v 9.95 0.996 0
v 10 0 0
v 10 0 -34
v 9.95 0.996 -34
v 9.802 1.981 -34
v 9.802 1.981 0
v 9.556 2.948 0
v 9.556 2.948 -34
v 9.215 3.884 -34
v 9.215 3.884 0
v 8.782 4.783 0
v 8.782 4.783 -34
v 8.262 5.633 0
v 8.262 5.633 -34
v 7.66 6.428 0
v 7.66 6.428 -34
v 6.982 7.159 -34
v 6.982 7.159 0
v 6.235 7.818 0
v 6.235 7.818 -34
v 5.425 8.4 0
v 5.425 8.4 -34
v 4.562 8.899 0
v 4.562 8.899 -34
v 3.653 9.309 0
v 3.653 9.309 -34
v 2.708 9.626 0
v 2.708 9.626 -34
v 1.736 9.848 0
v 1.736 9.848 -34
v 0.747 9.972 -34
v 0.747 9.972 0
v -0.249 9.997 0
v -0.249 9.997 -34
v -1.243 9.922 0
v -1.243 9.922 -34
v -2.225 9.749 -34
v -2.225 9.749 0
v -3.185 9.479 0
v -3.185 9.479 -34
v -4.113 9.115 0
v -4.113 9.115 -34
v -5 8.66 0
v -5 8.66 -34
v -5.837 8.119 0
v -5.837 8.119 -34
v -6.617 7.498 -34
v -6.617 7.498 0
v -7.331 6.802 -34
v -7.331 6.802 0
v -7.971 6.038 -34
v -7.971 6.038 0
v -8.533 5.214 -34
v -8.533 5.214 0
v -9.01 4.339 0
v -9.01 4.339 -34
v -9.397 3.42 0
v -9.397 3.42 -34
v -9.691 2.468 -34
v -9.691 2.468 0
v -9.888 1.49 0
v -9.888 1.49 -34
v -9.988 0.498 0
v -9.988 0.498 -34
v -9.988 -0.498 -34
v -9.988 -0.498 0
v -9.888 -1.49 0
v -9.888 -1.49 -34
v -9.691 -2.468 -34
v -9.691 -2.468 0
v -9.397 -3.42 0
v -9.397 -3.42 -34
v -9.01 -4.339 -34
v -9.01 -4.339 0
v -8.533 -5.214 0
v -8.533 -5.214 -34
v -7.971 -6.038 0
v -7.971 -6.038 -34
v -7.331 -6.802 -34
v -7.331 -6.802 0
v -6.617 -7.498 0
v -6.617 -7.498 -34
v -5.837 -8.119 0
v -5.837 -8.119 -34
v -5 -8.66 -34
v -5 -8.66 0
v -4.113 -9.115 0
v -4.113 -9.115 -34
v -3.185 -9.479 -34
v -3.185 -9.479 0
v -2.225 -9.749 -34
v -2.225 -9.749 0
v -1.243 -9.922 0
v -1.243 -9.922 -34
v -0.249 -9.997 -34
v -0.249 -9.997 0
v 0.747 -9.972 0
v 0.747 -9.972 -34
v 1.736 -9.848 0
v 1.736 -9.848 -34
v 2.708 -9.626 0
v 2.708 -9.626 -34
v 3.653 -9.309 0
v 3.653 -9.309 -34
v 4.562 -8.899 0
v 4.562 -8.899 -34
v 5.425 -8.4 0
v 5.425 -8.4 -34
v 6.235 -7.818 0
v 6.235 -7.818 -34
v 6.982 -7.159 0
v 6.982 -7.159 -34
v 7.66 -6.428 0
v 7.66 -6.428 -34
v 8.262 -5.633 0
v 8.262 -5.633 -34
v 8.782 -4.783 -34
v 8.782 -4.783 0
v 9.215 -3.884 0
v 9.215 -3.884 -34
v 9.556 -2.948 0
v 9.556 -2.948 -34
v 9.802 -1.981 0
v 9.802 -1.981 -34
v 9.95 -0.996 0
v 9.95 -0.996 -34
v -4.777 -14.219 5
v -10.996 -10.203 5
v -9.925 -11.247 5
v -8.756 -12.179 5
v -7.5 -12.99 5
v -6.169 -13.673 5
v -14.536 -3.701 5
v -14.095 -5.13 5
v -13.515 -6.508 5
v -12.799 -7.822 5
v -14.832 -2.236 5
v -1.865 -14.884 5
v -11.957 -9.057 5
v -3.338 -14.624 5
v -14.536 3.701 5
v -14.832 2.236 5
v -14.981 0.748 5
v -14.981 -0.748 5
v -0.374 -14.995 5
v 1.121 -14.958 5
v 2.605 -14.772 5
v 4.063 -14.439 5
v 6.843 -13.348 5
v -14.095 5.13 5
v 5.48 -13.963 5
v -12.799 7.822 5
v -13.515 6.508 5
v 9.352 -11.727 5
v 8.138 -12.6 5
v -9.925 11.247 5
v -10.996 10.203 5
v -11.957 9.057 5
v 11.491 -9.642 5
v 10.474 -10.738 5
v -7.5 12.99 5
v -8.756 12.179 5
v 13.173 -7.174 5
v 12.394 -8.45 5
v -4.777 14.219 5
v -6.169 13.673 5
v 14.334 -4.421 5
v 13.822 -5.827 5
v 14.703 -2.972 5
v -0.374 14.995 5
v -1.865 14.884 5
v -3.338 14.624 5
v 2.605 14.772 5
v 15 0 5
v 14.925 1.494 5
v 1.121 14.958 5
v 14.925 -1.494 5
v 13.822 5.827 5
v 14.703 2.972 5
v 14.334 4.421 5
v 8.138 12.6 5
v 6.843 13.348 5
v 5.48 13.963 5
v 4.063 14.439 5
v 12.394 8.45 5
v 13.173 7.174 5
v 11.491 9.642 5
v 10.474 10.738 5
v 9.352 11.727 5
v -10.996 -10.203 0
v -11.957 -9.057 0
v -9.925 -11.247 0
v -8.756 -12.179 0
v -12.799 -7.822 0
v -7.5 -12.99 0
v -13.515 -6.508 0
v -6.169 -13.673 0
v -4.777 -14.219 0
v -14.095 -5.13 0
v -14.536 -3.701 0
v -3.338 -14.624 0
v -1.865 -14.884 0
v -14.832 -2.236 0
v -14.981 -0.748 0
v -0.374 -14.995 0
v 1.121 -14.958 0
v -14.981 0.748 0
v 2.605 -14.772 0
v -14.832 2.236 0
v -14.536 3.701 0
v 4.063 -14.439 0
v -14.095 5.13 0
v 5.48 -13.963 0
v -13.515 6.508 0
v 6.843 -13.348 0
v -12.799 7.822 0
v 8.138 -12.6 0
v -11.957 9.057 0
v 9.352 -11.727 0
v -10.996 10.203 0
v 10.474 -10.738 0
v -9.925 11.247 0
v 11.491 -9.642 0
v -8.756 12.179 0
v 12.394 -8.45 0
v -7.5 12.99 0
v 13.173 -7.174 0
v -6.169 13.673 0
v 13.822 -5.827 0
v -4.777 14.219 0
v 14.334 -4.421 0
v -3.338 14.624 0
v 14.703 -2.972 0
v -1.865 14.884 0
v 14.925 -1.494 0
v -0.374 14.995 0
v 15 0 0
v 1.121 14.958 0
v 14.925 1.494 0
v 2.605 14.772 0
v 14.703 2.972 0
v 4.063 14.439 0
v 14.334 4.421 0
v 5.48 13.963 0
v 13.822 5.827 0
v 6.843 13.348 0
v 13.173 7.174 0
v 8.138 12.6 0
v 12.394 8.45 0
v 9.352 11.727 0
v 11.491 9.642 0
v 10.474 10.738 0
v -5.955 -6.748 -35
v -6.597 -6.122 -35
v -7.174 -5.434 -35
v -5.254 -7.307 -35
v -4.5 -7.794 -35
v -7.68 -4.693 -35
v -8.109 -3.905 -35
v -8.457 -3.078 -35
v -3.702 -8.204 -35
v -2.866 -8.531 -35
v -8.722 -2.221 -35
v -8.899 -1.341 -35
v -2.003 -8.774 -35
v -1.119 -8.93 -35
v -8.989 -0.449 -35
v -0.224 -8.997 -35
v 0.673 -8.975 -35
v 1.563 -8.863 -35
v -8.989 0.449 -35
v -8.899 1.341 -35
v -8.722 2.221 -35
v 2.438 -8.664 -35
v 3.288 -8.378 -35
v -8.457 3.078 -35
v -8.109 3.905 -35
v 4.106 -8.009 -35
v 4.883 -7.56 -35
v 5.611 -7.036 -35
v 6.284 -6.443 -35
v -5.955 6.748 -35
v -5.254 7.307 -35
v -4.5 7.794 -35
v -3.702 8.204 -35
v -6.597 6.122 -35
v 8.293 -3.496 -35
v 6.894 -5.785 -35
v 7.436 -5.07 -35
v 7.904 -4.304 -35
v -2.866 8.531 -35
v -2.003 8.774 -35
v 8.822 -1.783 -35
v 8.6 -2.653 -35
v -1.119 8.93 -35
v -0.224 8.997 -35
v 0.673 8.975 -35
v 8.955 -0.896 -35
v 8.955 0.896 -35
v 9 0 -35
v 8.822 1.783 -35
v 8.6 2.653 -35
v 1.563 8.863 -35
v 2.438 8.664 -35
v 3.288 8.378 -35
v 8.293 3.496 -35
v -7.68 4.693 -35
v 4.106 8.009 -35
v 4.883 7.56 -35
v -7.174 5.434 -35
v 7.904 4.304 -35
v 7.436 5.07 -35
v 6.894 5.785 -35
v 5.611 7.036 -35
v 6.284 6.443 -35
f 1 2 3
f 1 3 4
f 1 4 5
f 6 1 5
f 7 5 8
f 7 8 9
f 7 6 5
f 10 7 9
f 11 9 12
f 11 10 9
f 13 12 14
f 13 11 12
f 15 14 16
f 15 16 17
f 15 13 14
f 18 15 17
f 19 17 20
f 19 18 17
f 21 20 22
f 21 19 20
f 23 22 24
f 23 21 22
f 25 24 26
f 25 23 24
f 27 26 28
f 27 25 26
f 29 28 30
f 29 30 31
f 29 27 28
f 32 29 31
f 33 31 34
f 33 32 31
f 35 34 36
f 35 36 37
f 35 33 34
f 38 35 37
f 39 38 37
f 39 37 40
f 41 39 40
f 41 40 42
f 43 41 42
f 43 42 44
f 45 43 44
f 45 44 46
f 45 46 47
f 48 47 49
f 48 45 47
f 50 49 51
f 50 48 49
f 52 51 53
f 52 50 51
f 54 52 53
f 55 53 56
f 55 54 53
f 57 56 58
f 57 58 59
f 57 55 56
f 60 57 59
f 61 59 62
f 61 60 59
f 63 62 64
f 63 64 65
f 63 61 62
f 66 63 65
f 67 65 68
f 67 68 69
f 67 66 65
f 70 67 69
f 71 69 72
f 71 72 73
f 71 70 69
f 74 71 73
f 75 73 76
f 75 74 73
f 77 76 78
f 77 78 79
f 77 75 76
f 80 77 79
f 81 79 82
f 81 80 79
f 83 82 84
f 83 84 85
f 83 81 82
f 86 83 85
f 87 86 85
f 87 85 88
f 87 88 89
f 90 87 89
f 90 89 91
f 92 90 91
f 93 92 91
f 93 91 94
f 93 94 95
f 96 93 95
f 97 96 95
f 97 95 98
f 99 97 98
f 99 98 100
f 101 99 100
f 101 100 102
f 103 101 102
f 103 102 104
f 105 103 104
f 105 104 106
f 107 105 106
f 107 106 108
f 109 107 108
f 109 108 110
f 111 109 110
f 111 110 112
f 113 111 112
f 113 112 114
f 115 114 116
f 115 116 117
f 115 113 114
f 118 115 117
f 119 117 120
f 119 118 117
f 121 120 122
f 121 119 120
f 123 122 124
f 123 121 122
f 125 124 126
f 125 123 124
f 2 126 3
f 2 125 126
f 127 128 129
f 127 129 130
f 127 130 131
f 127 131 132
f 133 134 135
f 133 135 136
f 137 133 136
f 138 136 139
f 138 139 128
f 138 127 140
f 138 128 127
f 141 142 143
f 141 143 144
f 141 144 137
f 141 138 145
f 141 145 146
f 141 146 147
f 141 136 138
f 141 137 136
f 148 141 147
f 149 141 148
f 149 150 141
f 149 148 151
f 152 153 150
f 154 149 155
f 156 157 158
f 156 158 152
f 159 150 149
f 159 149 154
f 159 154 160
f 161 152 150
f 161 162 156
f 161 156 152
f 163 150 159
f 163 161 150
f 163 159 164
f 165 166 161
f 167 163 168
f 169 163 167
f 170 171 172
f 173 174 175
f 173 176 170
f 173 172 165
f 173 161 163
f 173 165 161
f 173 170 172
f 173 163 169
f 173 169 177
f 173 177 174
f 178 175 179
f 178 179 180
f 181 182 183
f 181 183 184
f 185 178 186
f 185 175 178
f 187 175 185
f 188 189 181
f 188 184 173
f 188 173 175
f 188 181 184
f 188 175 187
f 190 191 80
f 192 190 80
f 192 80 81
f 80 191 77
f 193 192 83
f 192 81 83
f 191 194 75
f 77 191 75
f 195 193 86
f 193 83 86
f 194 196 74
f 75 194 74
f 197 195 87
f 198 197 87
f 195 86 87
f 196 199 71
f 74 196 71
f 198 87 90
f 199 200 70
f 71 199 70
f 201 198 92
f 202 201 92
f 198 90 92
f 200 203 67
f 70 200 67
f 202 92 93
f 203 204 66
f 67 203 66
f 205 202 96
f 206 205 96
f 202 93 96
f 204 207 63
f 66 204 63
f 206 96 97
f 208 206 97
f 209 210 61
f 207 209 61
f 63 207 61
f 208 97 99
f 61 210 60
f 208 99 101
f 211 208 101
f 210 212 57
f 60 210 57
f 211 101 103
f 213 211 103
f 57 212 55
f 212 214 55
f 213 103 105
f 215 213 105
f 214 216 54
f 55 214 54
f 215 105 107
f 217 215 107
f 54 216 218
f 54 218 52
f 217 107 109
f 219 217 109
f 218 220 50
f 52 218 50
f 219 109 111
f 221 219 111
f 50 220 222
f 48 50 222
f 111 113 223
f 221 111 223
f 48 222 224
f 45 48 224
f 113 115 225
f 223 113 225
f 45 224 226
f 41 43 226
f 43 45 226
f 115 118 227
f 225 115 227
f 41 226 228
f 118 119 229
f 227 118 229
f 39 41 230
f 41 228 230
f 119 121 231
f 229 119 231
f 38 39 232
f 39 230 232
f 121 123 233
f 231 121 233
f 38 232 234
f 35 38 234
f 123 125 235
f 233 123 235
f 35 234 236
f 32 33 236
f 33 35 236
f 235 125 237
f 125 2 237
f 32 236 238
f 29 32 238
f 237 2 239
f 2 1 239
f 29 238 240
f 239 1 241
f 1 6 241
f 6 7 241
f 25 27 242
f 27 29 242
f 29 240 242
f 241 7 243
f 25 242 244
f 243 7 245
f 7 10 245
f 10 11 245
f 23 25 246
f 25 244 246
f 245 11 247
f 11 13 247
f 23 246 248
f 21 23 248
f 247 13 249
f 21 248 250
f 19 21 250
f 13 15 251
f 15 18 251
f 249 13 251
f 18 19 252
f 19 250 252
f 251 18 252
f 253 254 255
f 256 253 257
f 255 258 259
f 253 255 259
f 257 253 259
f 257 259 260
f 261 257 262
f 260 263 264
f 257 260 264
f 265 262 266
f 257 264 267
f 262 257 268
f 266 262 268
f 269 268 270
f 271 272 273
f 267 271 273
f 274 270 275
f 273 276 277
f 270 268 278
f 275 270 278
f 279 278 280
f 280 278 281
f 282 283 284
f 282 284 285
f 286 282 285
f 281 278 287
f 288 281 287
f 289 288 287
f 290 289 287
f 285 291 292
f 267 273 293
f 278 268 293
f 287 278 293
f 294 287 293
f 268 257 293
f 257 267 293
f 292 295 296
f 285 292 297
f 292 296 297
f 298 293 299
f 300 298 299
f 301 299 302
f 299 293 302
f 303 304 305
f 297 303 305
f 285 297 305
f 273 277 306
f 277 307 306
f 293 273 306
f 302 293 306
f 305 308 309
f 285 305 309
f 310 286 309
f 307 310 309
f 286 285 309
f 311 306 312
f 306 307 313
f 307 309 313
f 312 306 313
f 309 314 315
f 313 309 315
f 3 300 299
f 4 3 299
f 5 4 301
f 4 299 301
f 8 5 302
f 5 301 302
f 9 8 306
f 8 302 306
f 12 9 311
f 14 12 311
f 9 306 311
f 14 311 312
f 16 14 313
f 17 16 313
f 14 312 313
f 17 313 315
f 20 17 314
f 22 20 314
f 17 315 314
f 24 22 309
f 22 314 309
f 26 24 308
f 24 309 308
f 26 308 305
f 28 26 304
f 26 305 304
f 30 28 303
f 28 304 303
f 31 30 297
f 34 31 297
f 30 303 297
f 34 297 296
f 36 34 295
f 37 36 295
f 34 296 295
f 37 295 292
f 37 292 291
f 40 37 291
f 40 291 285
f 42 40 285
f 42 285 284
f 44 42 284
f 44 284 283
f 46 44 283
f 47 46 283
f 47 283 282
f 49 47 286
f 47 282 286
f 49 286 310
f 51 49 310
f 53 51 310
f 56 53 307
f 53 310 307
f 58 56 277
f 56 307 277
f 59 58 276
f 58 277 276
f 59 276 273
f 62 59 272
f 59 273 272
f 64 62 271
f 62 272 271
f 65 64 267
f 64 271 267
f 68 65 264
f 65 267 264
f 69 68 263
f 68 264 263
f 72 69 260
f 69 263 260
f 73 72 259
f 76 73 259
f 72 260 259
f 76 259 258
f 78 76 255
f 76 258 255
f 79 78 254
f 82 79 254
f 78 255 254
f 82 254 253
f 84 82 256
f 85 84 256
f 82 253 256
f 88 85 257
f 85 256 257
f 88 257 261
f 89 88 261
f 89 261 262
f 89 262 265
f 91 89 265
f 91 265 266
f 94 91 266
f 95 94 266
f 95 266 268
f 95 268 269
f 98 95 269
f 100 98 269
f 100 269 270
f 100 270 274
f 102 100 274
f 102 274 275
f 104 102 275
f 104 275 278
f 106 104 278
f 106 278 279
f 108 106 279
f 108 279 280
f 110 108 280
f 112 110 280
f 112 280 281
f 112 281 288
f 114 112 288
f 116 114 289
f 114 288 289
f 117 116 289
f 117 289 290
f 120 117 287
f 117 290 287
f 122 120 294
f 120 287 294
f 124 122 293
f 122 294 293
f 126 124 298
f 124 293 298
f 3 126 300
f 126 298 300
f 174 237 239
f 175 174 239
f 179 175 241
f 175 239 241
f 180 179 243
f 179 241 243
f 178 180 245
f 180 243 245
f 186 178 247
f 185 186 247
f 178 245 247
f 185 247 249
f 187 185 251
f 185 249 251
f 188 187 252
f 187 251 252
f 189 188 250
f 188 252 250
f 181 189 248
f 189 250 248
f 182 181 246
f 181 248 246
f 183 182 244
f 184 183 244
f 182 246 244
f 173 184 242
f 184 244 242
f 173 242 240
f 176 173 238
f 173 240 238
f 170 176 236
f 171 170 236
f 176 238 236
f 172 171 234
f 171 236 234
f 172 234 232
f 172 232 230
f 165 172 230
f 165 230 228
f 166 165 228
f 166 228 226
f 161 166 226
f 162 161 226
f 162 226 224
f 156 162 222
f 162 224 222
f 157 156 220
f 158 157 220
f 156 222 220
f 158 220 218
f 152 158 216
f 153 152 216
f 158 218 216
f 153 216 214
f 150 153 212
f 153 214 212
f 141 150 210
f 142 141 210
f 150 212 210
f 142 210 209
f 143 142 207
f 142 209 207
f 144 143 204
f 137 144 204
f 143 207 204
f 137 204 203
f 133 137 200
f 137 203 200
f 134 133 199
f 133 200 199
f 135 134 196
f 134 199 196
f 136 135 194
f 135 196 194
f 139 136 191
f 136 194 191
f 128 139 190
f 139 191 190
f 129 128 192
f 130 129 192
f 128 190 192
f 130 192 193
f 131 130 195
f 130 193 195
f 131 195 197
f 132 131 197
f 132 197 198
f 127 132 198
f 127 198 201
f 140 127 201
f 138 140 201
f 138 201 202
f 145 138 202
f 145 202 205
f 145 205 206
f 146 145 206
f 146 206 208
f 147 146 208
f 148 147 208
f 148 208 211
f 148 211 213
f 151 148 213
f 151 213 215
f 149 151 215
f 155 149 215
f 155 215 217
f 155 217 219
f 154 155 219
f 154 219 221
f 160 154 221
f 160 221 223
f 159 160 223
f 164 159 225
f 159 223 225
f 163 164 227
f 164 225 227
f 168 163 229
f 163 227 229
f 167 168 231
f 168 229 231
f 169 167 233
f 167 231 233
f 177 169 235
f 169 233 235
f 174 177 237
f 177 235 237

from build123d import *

# Parameters (mm, degrees)
SKETCH1_R           = 10
BOSS_EXTRUDE1_DEPTH = 35
SKETCH2_R           = 15
BOSS_EXTRUDE2_DEPTH = 5
CHAMFER1_SIZE       = 1


with BuildPart() as part:
    # Sketch1 → Boss-Extrude1 (new body)
    with BuildSketch(Plane.XY):
        Circle(SKETCH1_R)
    extrude(amount=-BOSS_EXTRUDE1_DEPTH)

    # Sketch2 → Boss-Extrude2 (add)
    with BuildSketch(Plane.XY):
        Circle(SKETCH2_R)
    extrude(amount=BOSS_EXTRUDE2_DEPTH)

    # Chamfer1
    chamfer1_edges = [part.edges().sort_by_distance(p)[0] for p in [
        (-10, 0, -35),
    ]]
    chamfer(chamfer1_edges, length=CHAMFER1_SIZE)


solid = part.part
